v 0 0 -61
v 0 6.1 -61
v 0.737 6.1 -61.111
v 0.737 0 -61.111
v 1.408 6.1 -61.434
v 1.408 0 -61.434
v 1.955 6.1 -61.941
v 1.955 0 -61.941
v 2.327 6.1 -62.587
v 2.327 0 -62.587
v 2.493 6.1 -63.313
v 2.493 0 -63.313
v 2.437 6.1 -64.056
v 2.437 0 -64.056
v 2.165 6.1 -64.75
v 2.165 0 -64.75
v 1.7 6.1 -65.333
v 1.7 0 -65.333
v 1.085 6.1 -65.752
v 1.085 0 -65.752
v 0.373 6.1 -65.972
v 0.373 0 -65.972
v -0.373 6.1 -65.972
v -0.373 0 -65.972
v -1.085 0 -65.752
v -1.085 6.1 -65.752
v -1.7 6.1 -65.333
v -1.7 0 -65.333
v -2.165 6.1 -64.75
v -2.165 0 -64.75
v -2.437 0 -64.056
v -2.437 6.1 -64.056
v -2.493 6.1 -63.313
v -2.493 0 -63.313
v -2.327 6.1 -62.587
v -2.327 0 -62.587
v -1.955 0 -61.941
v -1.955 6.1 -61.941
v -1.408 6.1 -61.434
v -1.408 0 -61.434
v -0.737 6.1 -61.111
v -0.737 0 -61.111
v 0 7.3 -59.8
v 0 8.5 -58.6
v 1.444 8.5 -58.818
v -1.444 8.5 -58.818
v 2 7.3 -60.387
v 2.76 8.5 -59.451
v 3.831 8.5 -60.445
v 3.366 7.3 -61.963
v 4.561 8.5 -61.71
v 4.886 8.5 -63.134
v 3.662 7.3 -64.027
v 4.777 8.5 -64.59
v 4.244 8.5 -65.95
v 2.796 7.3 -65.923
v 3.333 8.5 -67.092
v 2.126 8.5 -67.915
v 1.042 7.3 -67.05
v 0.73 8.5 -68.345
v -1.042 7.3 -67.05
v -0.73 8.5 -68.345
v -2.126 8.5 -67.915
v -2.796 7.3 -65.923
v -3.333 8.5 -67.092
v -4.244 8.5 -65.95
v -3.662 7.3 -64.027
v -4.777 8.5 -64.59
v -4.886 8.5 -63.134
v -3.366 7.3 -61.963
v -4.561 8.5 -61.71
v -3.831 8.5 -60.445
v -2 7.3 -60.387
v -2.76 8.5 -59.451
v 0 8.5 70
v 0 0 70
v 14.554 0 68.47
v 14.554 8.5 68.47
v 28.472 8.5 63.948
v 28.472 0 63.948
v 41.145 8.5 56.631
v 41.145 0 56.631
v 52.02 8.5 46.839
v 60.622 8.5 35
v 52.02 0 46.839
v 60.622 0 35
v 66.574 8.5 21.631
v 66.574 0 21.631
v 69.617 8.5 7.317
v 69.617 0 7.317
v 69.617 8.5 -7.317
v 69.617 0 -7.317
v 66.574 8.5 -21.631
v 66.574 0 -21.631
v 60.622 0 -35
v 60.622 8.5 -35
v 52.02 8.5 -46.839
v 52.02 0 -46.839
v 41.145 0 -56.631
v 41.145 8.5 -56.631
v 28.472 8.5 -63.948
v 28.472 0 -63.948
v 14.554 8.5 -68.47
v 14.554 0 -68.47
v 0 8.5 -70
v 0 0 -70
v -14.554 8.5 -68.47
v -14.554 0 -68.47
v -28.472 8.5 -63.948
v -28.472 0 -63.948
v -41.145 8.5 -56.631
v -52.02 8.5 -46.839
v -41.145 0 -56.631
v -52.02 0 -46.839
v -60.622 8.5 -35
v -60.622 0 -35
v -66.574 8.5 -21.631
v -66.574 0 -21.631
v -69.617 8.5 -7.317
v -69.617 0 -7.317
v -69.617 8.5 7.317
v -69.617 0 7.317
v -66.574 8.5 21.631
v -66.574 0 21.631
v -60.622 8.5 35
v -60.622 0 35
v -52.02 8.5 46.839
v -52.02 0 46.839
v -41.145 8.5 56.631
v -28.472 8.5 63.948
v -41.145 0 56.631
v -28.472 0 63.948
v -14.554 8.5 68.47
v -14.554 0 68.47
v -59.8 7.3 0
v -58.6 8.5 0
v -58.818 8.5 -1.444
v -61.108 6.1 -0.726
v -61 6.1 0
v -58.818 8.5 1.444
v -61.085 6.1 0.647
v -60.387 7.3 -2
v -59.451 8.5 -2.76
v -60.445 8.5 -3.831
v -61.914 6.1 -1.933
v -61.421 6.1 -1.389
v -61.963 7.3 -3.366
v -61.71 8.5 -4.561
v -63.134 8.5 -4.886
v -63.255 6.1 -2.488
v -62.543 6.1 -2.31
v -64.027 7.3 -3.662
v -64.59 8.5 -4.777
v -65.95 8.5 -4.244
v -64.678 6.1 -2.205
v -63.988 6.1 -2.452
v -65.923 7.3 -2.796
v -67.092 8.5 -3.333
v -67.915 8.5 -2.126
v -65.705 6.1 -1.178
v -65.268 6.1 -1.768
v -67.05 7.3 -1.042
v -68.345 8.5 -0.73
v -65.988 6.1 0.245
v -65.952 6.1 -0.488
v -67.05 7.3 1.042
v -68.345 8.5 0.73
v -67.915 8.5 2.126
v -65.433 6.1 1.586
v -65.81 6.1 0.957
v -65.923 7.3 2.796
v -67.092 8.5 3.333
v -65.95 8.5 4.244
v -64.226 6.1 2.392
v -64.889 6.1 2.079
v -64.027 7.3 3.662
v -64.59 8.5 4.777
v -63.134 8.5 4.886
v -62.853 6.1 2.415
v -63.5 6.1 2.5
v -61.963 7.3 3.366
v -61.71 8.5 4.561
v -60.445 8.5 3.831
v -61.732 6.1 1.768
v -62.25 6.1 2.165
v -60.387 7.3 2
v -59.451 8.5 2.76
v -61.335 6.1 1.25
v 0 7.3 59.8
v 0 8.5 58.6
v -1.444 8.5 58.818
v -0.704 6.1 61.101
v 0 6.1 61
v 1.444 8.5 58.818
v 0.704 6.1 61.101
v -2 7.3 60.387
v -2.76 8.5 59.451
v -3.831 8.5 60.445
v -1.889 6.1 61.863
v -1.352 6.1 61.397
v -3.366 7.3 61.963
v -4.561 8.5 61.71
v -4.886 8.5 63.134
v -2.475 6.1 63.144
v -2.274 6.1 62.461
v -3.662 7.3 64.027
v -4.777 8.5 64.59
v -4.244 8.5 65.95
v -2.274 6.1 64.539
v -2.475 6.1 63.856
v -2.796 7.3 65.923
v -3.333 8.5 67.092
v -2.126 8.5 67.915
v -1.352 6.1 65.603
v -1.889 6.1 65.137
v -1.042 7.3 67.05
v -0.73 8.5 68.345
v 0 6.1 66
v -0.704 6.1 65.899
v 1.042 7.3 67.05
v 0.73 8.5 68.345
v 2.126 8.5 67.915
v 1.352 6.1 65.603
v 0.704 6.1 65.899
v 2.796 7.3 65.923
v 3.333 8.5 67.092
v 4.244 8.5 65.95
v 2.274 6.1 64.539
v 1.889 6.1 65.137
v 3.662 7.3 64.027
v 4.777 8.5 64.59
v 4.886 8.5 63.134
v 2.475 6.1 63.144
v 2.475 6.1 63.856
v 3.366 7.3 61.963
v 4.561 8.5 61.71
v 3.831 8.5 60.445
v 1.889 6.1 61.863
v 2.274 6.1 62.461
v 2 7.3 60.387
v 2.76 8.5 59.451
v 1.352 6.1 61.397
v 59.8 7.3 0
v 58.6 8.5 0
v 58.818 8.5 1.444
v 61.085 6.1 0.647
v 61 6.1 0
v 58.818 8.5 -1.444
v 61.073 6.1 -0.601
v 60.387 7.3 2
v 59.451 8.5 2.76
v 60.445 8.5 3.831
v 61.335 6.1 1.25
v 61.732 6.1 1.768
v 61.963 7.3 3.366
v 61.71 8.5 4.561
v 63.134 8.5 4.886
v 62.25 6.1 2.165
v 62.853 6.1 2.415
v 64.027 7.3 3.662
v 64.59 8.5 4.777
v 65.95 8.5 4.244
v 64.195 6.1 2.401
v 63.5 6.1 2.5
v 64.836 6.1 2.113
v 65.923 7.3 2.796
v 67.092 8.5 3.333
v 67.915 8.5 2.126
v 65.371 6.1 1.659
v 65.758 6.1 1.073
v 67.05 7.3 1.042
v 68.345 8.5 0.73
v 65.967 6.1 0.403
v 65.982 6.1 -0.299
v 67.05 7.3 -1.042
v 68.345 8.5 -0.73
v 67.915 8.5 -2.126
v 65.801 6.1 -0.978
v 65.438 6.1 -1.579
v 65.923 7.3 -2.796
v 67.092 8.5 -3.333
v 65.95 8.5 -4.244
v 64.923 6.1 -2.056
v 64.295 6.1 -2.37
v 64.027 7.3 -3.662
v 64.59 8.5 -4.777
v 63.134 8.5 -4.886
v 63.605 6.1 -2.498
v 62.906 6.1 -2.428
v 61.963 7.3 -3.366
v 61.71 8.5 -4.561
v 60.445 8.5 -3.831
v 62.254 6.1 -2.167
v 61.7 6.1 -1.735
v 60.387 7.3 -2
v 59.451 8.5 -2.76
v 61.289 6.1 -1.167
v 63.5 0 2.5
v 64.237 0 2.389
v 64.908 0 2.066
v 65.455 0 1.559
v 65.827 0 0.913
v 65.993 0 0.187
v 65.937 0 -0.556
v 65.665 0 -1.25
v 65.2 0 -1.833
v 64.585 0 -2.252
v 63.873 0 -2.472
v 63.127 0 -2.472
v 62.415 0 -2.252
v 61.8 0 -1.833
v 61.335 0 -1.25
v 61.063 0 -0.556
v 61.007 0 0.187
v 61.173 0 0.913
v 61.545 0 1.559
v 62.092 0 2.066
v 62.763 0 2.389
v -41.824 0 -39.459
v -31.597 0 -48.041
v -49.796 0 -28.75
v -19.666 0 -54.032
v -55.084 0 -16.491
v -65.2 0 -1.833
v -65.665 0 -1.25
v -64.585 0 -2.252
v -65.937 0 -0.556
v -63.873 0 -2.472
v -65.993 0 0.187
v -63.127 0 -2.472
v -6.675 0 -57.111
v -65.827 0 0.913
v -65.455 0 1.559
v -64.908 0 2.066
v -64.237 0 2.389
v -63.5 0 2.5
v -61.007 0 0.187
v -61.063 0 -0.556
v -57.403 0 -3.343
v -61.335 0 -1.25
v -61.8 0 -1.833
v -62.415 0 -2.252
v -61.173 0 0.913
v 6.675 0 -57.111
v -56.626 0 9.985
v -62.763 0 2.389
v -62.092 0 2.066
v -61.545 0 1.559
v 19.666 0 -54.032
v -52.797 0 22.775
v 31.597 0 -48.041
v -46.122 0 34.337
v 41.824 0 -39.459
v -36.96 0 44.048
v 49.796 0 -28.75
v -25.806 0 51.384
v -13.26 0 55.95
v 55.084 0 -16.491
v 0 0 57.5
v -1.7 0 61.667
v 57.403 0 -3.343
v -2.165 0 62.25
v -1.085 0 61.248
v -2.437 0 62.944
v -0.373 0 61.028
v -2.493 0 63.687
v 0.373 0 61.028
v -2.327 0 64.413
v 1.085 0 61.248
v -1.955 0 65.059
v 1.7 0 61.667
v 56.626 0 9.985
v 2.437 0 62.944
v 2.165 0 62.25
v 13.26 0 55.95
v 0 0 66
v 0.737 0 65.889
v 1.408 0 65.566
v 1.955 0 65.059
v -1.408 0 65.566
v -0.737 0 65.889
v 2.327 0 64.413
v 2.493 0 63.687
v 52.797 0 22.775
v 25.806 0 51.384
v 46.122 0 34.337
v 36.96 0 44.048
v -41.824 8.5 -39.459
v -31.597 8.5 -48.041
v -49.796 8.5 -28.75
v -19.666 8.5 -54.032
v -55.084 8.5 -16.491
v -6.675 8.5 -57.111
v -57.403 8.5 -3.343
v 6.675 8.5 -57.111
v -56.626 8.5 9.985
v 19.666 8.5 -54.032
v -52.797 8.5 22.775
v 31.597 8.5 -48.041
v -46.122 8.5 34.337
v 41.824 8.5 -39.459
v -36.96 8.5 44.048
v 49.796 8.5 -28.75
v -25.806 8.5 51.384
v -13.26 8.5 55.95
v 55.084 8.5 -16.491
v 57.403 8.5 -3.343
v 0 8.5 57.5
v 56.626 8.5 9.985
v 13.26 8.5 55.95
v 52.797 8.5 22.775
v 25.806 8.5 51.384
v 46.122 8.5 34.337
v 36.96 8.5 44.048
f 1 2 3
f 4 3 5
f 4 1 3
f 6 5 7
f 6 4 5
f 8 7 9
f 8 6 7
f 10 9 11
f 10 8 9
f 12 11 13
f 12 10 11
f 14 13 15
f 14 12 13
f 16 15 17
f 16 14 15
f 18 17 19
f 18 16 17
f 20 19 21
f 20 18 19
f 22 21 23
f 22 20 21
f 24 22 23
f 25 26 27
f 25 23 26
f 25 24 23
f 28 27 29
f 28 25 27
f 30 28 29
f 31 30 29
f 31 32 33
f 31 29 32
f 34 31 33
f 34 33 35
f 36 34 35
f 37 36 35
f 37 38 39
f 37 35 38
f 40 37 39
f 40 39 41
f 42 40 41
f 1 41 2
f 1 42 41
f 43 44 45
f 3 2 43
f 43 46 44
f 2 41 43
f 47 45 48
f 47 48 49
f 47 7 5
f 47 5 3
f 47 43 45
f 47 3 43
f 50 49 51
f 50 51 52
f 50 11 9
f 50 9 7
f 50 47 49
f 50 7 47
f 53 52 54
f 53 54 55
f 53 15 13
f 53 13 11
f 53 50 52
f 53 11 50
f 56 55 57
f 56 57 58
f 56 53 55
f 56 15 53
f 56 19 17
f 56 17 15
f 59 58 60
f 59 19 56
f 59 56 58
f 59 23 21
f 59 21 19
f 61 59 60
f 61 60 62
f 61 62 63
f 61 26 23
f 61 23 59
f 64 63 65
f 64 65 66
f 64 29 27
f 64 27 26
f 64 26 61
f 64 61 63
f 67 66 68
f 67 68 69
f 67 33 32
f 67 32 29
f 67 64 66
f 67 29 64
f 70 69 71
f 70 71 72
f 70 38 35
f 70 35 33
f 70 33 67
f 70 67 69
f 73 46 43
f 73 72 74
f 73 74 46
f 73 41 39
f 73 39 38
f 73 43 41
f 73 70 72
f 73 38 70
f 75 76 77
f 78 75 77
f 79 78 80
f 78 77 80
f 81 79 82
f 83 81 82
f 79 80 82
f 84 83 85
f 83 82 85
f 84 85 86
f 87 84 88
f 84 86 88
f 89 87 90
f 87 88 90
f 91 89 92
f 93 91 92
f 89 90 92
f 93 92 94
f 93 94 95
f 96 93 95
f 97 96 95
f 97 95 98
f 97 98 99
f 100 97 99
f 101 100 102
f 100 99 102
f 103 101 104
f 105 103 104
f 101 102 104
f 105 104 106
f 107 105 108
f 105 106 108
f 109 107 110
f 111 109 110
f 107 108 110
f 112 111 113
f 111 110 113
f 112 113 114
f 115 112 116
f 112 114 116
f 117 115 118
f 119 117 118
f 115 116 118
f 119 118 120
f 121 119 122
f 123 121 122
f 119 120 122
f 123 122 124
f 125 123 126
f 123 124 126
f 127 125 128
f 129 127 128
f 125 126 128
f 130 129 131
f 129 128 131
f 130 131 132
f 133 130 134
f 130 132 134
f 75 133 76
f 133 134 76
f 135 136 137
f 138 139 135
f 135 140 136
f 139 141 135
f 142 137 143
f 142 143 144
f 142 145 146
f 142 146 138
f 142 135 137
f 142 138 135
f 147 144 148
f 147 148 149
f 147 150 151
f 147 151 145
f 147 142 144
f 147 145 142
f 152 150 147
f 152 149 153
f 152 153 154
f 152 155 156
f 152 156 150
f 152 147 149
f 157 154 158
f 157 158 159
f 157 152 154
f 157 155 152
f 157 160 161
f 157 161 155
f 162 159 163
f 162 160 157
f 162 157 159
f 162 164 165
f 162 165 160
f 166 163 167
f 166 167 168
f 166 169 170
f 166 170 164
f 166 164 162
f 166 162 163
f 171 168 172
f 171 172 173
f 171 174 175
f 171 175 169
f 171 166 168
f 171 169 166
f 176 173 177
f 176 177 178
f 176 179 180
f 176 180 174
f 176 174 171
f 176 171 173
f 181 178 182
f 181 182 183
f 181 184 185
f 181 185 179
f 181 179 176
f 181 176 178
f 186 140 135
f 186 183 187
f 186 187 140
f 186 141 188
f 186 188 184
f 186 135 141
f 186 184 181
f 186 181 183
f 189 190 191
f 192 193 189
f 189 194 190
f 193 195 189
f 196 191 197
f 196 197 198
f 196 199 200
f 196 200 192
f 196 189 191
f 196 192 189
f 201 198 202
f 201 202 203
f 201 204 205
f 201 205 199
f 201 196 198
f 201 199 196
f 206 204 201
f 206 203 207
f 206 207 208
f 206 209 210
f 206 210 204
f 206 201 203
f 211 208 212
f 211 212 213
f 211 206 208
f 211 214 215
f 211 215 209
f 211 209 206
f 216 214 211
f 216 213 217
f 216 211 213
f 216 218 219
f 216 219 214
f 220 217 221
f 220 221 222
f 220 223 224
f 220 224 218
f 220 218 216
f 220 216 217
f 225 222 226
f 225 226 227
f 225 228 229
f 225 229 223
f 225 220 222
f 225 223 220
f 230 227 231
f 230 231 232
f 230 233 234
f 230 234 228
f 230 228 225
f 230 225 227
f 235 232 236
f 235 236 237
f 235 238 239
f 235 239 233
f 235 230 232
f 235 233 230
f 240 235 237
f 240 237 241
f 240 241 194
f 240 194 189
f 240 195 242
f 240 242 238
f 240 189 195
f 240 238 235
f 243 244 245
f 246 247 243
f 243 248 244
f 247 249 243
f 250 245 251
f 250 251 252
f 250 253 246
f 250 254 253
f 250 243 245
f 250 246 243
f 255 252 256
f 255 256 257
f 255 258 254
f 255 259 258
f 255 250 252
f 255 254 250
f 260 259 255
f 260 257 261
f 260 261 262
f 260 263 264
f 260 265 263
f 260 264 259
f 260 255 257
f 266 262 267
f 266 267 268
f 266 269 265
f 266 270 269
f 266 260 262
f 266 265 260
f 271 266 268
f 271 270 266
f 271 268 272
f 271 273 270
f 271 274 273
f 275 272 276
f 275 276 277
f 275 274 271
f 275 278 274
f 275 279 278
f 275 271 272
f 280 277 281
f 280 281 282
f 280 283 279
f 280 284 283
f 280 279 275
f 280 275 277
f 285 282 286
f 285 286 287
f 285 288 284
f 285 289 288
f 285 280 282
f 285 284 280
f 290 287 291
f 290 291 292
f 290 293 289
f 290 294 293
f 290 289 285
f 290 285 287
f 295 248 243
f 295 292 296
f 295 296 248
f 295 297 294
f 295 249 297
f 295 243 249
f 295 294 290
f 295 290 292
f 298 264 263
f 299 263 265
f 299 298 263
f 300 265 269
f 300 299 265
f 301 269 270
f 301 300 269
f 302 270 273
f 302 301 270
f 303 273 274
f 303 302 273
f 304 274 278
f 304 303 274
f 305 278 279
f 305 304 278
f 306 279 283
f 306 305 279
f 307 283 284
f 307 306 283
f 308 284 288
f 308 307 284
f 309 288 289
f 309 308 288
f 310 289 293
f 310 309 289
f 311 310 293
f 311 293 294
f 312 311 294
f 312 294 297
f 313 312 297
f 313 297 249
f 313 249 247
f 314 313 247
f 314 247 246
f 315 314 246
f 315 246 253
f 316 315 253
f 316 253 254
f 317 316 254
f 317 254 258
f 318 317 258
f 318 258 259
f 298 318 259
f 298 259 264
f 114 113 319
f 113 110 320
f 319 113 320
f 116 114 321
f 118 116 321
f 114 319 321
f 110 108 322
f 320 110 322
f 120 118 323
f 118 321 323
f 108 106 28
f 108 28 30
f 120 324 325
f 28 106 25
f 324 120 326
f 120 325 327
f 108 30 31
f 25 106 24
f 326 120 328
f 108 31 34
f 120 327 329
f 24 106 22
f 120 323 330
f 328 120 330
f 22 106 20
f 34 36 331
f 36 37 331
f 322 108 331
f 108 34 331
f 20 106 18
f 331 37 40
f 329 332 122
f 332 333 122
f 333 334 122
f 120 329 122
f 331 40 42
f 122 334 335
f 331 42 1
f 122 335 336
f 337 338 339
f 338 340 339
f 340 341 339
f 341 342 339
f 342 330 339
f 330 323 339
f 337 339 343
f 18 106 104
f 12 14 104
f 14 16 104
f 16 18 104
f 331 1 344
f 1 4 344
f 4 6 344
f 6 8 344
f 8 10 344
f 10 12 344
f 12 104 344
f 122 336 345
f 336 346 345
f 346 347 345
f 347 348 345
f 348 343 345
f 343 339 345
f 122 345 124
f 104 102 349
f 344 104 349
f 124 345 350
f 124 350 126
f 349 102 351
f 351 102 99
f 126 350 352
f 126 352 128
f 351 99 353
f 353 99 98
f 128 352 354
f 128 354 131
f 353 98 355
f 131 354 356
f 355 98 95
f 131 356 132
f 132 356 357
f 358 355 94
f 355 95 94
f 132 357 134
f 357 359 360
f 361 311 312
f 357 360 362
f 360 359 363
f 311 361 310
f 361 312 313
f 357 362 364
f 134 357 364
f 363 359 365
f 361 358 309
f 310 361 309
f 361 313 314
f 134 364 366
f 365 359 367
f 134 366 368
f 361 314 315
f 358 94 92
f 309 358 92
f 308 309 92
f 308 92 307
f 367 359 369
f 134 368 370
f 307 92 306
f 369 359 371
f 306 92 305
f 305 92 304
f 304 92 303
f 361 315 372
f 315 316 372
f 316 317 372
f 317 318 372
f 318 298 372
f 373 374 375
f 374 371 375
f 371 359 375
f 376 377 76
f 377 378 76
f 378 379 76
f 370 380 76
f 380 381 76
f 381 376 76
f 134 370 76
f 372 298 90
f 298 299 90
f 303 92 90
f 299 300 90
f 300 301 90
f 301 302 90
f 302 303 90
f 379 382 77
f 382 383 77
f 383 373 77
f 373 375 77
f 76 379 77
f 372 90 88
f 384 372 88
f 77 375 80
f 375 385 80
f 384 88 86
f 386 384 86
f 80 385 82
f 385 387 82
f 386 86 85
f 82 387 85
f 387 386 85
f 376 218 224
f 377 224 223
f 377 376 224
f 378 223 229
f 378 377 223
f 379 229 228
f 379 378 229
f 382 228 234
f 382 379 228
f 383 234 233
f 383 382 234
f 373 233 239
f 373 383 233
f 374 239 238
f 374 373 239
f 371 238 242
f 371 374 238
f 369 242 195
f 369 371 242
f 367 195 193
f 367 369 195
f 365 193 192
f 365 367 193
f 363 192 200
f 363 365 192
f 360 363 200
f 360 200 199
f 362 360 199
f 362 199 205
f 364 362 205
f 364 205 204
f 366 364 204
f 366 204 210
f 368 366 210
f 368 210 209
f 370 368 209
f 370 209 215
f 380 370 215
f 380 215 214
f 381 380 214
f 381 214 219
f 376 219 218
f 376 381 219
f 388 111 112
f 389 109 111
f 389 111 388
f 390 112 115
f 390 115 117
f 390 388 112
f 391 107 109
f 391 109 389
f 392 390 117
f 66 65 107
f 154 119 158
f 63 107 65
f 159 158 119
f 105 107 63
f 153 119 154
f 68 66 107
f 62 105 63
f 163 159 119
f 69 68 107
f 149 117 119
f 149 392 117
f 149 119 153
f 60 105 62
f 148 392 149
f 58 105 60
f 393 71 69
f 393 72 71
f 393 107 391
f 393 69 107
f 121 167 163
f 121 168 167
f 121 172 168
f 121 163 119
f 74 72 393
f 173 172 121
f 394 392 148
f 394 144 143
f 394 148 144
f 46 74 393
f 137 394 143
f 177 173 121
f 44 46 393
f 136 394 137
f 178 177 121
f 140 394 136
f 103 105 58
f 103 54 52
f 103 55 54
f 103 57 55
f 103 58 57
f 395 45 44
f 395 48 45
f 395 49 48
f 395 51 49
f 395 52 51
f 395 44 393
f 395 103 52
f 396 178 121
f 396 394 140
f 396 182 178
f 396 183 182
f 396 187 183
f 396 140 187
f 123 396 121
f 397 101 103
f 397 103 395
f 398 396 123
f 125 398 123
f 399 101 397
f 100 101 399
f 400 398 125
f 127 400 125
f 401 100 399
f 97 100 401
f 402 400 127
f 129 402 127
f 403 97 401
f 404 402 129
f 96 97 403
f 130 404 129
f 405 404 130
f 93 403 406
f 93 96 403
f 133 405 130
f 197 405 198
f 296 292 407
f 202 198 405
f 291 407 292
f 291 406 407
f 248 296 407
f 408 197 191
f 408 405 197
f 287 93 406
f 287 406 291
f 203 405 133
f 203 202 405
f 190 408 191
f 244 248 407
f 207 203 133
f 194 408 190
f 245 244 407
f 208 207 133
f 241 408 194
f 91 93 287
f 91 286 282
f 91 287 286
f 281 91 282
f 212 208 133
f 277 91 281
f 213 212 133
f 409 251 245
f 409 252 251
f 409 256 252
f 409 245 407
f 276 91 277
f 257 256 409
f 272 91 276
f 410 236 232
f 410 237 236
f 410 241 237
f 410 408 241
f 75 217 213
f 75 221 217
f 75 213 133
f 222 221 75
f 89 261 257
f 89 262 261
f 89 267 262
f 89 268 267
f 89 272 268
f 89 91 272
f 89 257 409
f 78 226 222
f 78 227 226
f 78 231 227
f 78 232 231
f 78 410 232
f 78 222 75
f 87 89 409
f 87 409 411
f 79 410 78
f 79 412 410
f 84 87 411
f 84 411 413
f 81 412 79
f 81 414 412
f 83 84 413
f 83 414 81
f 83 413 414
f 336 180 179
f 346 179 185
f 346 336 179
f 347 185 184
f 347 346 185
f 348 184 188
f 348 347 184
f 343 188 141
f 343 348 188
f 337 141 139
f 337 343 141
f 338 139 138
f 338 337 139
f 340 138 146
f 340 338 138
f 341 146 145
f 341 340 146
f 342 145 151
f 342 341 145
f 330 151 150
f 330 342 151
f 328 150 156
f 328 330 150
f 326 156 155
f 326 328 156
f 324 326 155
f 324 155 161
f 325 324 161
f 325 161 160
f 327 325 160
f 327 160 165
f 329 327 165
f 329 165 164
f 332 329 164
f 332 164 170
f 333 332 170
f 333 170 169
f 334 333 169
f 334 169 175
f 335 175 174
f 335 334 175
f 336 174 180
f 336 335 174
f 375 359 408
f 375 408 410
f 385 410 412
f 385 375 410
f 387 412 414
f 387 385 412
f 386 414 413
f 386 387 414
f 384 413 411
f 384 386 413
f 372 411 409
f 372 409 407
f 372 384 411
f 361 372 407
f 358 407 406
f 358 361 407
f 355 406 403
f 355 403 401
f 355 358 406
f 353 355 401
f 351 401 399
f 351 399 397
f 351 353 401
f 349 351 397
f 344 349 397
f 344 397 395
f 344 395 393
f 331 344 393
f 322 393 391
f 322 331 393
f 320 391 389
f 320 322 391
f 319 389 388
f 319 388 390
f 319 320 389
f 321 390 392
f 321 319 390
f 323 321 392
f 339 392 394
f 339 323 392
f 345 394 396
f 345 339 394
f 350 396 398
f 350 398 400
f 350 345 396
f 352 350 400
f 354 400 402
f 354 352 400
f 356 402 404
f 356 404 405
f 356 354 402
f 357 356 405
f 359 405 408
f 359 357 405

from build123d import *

# Parameters (mm, degrees)
SKETCH_1_R               = 70
SKETCH_1_R_2             = 2.5
SKETCH_1_R_3             = 57.5
EXTRUDE_1_DEPTH          = 8.5
PATTERN_CIRCULAR_1_COUNT = 4


with BuildPart() as part:
    # 草图1 → 凸台-拉伸1 (new body)
    with BuildSketch(Plane(origin=(0, 0, 0), x_dir=(1, 0, 0), z_dir=(0, 1, 0))):
        Circle(SKETCH_1_R)
        with Locations((0, -63.5)):
            Circle(SKETCH_1_R_2, mode=Mode.SUBTRACT)
        with Locations((63.5, 0)):
            Circle(SKETCH_1_R_2, mode=Mode.SUBTRACT)
        with Locations((-63.5, 0)):
            Circle(SKETCH_1_R_2, mode=Mode.SUBTRACT)
        Circle(SKETCH_1_R_3, mode=Mode.SUBTRACT)
        with Locations((0, 63.5)):
            Circle(SKETCH_1_R_2, mode=Mode.SUBTRACT)
    extrude(amount=EXTRUDE_1_DEPTH)

    # 草图2 → 切除-旋转1 (revolve, cut)
    with BuildSketch(Plane.XY.offset(-63.5)):
        Polygon((0, 8.5), (4.9, 8.5), (1.6, 5.2), (0, 5.2), align=None)
    cut_revolve_1 = revolve(axis=Axis((0, 0, -63.5), (0, 1, 0)), mode=Mode.SUBTRACT)

    # 阵列(圆周)1: 切除-旋转1 ×4 about axis
    pattern_circular_1_axis = Axis((0, 8.5, 0), (0, -1, 0))
    for i in range(1, PATTERN_CIRCULAR_1_COUNT):
        add(cut_revolve_1.rotate(pattern_circular_1_axis, i * 360 / PATTERN_CIRCULAR_1_COUNT), mode=Mode.SUBTRACT)


solid = part.part
